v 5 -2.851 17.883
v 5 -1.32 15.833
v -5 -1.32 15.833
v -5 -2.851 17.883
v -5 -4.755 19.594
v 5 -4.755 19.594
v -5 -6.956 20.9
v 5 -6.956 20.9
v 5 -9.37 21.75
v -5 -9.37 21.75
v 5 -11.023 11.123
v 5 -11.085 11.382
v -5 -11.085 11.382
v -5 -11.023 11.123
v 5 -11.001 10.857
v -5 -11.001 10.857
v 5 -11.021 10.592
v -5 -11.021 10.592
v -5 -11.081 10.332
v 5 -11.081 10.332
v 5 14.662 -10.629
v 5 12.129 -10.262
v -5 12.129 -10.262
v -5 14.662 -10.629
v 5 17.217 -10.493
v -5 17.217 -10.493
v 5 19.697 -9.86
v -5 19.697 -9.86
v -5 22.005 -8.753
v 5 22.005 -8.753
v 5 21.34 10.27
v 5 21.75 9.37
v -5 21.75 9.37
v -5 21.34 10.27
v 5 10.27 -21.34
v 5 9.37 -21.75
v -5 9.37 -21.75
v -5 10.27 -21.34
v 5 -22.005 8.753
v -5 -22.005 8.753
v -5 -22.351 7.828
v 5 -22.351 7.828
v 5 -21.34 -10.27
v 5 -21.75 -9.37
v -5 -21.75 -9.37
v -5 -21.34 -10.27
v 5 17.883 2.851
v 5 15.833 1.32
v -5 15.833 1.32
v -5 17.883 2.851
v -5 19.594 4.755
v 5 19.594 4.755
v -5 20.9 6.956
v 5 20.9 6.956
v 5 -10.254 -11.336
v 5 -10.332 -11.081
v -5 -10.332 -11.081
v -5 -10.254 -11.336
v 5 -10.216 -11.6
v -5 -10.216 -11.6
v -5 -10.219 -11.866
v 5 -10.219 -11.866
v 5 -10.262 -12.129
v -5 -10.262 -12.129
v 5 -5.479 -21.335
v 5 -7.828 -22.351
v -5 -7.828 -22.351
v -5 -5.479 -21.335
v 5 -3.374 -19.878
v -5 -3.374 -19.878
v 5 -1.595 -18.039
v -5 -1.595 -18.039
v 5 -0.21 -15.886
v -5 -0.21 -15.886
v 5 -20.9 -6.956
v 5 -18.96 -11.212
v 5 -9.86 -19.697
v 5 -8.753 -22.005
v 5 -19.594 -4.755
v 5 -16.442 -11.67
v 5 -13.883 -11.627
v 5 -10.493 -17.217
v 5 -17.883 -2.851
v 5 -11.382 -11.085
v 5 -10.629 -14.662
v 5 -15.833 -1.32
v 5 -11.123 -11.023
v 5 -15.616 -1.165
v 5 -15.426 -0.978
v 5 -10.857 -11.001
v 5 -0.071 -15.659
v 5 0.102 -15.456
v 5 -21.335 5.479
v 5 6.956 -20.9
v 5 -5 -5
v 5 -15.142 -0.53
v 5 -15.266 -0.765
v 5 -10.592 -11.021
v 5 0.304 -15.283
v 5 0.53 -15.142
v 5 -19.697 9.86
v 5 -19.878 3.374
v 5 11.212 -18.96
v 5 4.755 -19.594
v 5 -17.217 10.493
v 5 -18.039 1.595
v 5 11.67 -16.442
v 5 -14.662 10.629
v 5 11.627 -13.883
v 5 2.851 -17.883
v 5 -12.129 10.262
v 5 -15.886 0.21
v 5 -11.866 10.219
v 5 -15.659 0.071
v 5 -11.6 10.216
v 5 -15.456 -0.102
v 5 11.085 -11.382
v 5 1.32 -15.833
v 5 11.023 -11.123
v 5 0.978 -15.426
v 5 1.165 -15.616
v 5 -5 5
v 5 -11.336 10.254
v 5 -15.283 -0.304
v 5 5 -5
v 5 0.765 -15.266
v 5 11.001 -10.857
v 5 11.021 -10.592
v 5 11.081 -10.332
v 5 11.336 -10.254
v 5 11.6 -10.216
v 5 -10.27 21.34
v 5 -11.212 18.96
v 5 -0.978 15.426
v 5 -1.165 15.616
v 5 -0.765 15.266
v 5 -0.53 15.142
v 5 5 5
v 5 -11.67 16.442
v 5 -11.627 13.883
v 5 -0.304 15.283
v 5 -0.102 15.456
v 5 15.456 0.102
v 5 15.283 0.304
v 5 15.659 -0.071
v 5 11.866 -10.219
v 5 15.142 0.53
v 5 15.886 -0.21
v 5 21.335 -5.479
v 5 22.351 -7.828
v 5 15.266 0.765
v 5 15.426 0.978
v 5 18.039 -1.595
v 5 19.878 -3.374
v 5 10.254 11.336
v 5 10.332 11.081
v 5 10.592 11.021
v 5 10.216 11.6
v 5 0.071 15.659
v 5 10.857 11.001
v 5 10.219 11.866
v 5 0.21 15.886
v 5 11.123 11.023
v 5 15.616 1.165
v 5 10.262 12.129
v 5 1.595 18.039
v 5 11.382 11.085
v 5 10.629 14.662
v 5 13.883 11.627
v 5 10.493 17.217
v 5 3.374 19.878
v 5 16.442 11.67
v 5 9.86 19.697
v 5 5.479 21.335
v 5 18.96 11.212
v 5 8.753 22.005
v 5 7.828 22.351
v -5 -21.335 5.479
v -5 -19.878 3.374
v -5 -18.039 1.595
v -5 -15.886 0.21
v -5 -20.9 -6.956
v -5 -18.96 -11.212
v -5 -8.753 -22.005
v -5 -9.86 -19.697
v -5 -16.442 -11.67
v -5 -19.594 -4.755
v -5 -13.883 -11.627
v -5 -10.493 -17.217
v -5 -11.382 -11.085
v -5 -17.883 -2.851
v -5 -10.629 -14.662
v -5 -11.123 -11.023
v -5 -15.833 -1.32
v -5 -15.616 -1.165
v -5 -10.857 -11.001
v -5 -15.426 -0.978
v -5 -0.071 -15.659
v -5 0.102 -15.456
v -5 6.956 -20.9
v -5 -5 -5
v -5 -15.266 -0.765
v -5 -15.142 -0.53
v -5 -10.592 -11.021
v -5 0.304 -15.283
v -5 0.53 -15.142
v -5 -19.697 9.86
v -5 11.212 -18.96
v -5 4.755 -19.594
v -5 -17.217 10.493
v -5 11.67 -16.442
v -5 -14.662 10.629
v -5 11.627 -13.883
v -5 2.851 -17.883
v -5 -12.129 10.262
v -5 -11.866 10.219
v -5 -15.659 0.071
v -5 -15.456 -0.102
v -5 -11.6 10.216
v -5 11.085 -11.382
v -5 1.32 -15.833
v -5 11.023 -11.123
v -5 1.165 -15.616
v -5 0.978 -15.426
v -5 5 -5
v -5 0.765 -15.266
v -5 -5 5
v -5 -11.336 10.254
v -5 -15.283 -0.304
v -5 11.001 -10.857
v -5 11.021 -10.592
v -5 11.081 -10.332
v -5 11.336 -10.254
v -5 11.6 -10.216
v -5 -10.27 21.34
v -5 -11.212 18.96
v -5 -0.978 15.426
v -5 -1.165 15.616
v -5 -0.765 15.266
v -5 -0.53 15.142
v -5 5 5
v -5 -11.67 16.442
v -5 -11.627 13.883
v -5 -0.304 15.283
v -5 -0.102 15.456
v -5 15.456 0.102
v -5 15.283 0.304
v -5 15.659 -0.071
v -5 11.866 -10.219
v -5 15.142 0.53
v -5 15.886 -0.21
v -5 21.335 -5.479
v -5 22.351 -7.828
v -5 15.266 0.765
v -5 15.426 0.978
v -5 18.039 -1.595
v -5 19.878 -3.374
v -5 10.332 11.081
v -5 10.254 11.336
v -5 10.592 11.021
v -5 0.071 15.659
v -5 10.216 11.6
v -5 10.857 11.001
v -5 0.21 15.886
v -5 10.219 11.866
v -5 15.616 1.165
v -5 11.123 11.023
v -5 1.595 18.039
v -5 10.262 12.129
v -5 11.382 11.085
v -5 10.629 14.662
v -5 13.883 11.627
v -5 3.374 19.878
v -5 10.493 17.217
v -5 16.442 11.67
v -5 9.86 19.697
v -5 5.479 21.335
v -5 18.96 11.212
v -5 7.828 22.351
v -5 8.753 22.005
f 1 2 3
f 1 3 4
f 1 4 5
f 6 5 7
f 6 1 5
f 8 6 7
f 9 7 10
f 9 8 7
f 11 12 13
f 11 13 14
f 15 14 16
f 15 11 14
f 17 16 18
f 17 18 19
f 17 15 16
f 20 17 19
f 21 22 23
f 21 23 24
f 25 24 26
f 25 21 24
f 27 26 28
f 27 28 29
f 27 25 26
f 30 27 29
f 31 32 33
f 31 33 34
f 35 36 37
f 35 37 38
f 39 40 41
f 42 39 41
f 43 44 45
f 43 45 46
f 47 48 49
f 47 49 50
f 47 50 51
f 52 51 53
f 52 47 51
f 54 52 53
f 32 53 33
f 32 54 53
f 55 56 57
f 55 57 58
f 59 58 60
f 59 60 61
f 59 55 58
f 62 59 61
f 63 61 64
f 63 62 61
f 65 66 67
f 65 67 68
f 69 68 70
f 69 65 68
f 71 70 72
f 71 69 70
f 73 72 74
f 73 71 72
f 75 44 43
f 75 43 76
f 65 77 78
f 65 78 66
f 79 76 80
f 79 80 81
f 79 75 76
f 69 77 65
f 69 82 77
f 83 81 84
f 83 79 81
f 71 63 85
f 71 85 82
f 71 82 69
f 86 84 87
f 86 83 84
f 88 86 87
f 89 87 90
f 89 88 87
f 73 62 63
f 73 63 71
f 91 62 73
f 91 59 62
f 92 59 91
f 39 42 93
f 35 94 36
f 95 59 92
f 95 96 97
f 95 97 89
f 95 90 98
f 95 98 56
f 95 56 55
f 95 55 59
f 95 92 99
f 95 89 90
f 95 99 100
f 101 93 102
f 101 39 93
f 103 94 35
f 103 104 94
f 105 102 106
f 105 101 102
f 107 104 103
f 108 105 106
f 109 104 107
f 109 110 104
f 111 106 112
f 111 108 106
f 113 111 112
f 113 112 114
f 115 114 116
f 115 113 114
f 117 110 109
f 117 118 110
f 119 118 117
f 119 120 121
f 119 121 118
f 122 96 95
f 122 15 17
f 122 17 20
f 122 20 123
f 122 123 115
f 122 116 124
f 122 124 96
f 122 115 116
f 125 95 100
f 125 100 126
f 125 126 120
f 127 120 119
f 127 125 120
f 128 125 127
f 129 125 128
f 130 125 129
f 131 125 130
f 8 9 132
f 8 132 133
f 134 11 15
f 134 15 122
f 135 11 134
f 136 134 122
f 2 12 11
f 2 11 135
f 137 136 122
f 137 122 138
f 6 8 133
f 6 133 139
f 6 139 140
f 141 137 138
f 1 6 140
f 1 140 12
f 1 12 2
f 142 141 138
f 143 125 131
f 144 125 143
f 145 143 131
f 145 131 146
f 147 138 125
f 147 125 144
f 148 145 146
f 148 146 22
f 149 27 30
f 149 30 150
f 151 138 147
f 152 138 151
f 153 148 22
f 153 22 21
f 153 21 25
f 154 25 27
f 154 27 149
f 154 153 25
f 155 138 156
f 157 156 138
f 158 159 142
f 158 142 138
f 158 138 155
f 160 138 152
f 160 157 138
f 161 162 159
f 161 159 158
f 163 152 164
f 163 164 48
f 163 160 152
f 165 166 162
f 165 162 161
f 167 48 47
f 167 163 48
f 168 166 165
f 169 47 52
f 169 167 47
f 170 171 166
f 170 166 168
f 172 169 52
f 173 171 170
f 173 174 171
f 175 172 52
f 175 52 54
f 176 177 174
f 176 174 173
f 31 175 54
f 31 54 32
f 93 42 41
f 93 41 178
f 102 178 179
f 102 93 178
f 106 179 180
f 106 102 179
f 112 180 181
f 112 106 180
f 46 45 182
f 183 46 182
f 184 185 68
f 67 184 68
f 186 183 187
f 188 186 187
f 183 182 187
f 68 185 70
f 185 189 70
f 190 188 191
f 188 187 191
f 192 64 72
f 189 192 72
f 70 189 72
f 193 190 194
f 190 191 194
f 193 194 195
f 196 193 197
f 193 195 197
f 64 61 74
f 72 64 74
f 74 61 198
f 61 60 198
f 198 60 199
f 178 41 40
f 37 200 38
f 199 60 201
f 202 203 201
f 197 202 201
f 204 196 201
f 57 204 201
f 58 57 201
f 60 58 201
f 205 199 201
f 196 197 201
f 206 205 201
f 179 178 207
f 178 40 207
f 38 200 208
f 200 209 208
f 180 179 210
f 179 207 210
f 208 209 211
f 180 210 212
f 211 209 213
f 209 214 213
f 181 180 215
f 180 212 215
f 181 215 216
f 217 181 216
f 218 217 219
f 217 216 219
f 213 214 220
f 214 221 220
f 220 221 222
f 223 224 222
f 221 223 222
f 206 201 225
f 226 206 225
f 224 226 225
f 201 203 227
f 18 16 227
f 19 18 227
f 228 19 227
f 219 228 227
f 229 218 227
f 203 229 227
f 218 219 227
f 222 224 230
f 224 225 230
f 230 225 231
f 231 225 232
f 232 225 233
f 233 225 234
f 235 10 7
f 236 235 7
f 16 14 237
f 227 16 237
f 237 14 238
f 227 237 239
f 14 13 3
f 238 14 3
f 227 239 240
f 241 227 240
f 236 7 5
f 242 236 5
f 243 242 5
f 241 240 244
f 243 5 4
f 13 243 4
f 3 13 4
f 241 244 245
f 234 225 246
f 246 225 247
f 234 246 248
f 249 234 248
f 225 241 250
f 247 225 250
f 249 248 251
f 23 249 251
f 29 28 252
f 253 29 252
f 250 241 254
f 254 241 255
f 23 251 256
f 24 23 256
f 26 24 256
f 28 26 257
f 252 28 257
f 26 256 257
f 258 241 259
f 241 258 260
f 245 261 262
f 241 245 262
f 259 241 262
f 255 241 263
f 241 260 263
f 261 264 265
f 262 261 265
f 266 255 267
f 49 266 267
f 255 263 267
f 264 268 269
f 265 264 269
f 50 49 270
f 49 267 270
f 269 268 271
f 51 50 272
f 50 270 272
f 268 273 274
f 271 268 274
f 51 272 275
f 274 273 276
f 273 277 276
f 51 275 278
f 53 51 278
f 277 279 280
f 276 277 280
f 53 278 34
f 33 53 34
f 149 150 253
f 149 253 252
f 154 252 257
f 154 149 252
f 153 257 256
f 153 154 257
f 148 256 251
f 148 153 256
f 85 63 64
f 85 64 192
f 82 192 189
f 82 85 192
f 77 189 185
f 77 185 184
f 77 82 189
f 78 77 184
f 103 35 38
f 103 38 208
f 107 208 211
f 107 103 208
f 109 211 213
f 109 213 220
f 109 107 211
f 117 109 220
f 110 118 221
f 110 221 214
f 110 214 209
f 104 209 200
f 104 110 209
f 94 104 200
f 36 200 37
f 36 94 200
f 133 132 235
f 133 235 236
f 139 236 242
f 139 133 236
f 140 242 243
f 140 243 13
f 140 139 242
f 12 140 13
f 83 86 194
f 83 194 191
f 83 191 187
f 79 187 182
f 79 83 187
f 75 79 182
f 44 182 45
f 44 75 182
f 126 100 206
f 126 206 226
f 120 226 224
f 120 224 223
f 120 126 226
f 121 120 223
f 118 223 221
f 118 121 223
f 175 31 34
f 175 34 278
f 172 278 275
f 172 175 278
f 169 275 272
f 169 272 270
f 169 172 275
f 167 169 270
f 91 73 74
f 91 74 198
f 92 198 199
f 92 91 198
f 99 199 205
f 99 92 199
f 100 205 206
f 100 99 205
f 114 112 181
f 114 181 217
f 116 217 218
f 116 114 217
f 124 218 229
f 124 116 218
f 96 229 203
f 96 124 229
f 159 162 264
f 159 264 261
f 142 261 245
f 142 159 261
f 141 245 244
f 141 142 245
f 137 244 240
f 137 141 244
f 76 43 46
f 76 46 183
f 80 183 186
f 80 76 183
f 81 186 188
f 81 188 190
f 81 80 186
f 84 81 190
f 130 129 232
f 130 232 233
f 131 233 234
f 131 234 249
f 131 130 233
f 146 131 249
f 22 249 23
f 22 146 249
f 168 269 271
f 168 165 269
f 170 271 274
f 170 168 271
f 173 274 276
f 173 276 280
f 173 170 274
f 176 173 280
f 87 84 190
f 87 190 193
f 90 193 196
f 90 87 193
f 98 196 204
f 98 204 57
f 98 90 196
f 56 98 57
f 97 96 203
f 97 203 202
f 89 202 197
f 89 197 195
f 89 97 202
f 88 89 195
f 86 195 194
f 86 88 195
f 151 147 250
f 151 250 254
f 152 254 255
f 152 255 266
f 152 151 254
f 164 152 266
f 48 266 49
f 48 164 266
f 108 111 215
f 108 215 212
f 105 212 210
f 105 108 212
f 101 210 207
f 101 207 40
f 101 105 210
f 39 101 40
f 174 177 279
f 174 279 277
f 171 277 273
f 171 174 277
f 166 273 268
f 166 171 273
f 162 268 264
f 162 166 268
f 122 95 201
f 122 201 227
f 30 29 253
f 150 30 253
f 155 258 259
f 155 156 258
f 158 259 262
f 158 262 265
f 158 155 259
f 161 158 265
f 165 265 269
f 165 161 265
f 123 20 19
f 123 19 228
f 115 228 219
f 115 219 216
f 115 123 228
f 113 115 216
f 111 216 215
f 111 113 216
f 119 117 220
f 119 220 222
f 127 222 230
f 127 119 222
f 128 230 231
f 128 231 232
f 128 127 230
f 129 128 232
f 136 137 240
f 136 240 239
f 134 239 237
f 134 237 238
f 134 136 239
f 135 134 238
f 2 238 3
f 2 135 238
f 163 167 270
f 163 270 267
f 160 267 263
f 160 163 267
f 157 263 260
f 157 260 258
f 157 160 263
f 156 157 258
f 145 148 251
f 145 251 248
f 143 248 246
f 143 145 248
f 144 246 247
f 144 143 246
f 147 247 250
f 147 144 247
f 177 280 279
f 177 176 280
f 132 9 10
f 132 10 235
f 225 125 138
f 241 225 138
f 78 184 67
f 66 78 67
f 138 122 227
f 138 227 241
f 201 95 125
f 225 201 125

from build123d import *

# Parameters (mm, degrees)
F1_DEPTH      = 5
F2_W          = 10
F2_H          = 10
F3_DEPTH      = 5.001
F3_DEPTH_BACK = 5.001


with BuildPart() as f1:
    # F0 (on Right) → F1 (new body, symmetric)
    with BuildSketch(Plane.YZ):
        with BuildLine():
            Line((8.7534596749, 22.0049817023), (7.8275281652, 22.3511091184))
            ThreePointArc((7.8275281652, 22.3511091184), (3.3739717902, 19.8784451352), (0.2100715875, 15.8862067822))
            ThreePointArc((0.2100715875, 15.8862067822), (-0.1018352129, 15.4564251276), (-0.5296881322, 15.1418778303))
            ThreePointArc((-0.5296881322, 15.1418778303), (-0.9784750701, 15.4257588038), (-1.3196516389, 15.8326945133))
            ThreePointArc((-1.3196516389, 15.8326945133), (-4.754786797, 19.5940876069), (-9.3702410866, 21.7495024766))
            Line((-9.3702410866, 21.7495024766), (-10.2697225791, 21.3395190702))
            ThreePointArc((-10.2697225791, 21.3395190702), (-11.6704250222, 16.4419416869), (-11.084701499, 11.3817875871))
            ThreePointArc((-11.084701499, 11.3817875871), (-11.0013513902, 10.857334651), (-11.0814705639, 10.3323784235))
            ThreePointArc((-11.0814705639, 10.3323784235), (-11.5995450124, 10.2157722978), (-12.1285402775, 10.2622710322))
            ThreePointArc((-12.1285402775, 10.2622710322), (-17.2172542053, 10.4929702308), (-22.0049817023, 8.7534596749))
            Line((-22.0049817023, 8.7534596749), (-22.3511091184, 7.8275281652))
            ThreePointArc((-22.3511091184, 7.8275281652), (-19.8784451352, 3.3739717902), (-15.8862067822, 0.2100715875))
            ThreePointArc((-15.8862067822, 0.2100715875), (-15.4564251276, -0.1018352129), (-15.1418778303, -0.5296881322))
            ThreePointArc((-15.1418778303, -0.5296881322), (-15.4257588038, -0.9784750701), (-15.8326945133, -1.3196516389))
            ThreePointArc((-15.8326945133, -1.3196516389), (-19.5940876069, -4.754786797), (-21.7495024766, -9.3702410866))
            Line((-21.7495024766, -9.3702410866), (-21.3395190702, -10.2697225791))
            ThreePointArc((-21.3395190702, -10.2697225791), (-16.4419416869, -11.6704250222), (-11.3817875871, -11.084701499))
            ThreePointArc((-11.3817875871, -11.084701499), (-10.857334651, -11.0013513902), (-10.3323784235, -11.0814705639))
            ThreePointArc((-10.3323784235, -11.0814705639), (-10.2157722978, -11.5995450124), (-10.2622710322, -12.1285402775))
            ThreePointArc((-10.2622710322, -12.1285402775), (-10.4929702308, -17.2172542053), (-8.7534596749, -22.0049817023))
            Line((-8.7534596749, -22.0049817023), (-7.8275281652, -22.3511091184))
            ThreePointArc((-7.8275281652, -22.3511091184), (-3.3739717902, -19.8784451352), (-0.2100715875, -15.8862067822))
            ThreePointArc((-0.2100715875, -15.8862067822), (0.1018352129, -15.4564251276), (0.5296881322, -15.1418778303))
            ThreePointArc((0.5296881322, -15.1418778303), (0.9784750701, -15.4257588038), (1.3196516389, -15.8326945133))
            ThreePointArc((1.3196516389, -15.8326945133), (4.754786797, -19.5940876069), (9.3702410866, -21.7495024766))
            Line((9.3702410866, -21.7495024766), (10.2697225791, -21.3395190702))
            ThreePointArc((10.2697225791, -21.3395190702), (11.6704250222, -16.4419416869), (11.084701499, -11.3817875871))
            ThreePointArc((11.084701499, -11.3817875871), (11.0013513902, -10.857334651), (11.0814705639, -10.3323784235))
            ThreePointArc((11.0814705639, -10.3323784235), (11.5995450124, -10.2157722978), (12.1285402775, -10.2622710322))
            ThreePointArc((12.1285402775, -10.2622710322), (17.2172542053, -10.4929702308), (22.0049817023, -8.7534596749))
            Line((22.0049817023, -8.7534596749), (22.3511091184, -7.8275281652))
            ThreePointArc((22.3511091184, -7.8275281652), (19.8784451352, -3.3739717902), (15.8862067822, -0.2100715875))
            ThreePointArc((15.8862067822, -0.2100715875), (15.4564251276, 0.1018352129), (15.1418778303, 0.5296881322))
            ThreePointArc((15.1418778303, 0.5296881322), (15.4257588038, 0.9784750701), (15.8326945133, 1.3196516389))
            ThreePointArc((15.8326945133, 1.3196516389), (19.5940876069, 4.754786797), (21.7495024766, 9.3702410866))
            Line((21.7495024766, 9.3702410866), (21.3395190702, 10.2697225791))
            ThreePointArc((21.3395190702, 10.2697225791), (16.4419416869, 11.6704250222), (11.3817875871, 11.084701499))
            ThreePointArc((11.3817875871, 11.084701499), (10.857334651, 11.0013513902), (10.3323784235, 11.0814705639))
            ThreePointArc((10.3323784235, 11.0814705639), (10.2157722978, 11.5995450124), (10.2622710322, 12.1285402775))
            ThreePointArc((10.2622710322, 12.1285402775), (10.4929702308, 17.2172542053), (8.7534596749, 22.0049817023))
        make_face()
    extrude(amount=F1_DEPTH, both=True)

    # F2 (on Right) → F3 (cut, two sides)
    with BuildSketch(Plane.YZ) as f3_sk:
        Rectangle(F2_W, F2_H)
    extrude(amount=-F3_DEPTH, mode=Mode.SUBTRACT)
    extrude(f3_sk.sketch, amount=F3_DEPTH_BACK, mode=Mode.SUBTRACT)


solid = f1.part
